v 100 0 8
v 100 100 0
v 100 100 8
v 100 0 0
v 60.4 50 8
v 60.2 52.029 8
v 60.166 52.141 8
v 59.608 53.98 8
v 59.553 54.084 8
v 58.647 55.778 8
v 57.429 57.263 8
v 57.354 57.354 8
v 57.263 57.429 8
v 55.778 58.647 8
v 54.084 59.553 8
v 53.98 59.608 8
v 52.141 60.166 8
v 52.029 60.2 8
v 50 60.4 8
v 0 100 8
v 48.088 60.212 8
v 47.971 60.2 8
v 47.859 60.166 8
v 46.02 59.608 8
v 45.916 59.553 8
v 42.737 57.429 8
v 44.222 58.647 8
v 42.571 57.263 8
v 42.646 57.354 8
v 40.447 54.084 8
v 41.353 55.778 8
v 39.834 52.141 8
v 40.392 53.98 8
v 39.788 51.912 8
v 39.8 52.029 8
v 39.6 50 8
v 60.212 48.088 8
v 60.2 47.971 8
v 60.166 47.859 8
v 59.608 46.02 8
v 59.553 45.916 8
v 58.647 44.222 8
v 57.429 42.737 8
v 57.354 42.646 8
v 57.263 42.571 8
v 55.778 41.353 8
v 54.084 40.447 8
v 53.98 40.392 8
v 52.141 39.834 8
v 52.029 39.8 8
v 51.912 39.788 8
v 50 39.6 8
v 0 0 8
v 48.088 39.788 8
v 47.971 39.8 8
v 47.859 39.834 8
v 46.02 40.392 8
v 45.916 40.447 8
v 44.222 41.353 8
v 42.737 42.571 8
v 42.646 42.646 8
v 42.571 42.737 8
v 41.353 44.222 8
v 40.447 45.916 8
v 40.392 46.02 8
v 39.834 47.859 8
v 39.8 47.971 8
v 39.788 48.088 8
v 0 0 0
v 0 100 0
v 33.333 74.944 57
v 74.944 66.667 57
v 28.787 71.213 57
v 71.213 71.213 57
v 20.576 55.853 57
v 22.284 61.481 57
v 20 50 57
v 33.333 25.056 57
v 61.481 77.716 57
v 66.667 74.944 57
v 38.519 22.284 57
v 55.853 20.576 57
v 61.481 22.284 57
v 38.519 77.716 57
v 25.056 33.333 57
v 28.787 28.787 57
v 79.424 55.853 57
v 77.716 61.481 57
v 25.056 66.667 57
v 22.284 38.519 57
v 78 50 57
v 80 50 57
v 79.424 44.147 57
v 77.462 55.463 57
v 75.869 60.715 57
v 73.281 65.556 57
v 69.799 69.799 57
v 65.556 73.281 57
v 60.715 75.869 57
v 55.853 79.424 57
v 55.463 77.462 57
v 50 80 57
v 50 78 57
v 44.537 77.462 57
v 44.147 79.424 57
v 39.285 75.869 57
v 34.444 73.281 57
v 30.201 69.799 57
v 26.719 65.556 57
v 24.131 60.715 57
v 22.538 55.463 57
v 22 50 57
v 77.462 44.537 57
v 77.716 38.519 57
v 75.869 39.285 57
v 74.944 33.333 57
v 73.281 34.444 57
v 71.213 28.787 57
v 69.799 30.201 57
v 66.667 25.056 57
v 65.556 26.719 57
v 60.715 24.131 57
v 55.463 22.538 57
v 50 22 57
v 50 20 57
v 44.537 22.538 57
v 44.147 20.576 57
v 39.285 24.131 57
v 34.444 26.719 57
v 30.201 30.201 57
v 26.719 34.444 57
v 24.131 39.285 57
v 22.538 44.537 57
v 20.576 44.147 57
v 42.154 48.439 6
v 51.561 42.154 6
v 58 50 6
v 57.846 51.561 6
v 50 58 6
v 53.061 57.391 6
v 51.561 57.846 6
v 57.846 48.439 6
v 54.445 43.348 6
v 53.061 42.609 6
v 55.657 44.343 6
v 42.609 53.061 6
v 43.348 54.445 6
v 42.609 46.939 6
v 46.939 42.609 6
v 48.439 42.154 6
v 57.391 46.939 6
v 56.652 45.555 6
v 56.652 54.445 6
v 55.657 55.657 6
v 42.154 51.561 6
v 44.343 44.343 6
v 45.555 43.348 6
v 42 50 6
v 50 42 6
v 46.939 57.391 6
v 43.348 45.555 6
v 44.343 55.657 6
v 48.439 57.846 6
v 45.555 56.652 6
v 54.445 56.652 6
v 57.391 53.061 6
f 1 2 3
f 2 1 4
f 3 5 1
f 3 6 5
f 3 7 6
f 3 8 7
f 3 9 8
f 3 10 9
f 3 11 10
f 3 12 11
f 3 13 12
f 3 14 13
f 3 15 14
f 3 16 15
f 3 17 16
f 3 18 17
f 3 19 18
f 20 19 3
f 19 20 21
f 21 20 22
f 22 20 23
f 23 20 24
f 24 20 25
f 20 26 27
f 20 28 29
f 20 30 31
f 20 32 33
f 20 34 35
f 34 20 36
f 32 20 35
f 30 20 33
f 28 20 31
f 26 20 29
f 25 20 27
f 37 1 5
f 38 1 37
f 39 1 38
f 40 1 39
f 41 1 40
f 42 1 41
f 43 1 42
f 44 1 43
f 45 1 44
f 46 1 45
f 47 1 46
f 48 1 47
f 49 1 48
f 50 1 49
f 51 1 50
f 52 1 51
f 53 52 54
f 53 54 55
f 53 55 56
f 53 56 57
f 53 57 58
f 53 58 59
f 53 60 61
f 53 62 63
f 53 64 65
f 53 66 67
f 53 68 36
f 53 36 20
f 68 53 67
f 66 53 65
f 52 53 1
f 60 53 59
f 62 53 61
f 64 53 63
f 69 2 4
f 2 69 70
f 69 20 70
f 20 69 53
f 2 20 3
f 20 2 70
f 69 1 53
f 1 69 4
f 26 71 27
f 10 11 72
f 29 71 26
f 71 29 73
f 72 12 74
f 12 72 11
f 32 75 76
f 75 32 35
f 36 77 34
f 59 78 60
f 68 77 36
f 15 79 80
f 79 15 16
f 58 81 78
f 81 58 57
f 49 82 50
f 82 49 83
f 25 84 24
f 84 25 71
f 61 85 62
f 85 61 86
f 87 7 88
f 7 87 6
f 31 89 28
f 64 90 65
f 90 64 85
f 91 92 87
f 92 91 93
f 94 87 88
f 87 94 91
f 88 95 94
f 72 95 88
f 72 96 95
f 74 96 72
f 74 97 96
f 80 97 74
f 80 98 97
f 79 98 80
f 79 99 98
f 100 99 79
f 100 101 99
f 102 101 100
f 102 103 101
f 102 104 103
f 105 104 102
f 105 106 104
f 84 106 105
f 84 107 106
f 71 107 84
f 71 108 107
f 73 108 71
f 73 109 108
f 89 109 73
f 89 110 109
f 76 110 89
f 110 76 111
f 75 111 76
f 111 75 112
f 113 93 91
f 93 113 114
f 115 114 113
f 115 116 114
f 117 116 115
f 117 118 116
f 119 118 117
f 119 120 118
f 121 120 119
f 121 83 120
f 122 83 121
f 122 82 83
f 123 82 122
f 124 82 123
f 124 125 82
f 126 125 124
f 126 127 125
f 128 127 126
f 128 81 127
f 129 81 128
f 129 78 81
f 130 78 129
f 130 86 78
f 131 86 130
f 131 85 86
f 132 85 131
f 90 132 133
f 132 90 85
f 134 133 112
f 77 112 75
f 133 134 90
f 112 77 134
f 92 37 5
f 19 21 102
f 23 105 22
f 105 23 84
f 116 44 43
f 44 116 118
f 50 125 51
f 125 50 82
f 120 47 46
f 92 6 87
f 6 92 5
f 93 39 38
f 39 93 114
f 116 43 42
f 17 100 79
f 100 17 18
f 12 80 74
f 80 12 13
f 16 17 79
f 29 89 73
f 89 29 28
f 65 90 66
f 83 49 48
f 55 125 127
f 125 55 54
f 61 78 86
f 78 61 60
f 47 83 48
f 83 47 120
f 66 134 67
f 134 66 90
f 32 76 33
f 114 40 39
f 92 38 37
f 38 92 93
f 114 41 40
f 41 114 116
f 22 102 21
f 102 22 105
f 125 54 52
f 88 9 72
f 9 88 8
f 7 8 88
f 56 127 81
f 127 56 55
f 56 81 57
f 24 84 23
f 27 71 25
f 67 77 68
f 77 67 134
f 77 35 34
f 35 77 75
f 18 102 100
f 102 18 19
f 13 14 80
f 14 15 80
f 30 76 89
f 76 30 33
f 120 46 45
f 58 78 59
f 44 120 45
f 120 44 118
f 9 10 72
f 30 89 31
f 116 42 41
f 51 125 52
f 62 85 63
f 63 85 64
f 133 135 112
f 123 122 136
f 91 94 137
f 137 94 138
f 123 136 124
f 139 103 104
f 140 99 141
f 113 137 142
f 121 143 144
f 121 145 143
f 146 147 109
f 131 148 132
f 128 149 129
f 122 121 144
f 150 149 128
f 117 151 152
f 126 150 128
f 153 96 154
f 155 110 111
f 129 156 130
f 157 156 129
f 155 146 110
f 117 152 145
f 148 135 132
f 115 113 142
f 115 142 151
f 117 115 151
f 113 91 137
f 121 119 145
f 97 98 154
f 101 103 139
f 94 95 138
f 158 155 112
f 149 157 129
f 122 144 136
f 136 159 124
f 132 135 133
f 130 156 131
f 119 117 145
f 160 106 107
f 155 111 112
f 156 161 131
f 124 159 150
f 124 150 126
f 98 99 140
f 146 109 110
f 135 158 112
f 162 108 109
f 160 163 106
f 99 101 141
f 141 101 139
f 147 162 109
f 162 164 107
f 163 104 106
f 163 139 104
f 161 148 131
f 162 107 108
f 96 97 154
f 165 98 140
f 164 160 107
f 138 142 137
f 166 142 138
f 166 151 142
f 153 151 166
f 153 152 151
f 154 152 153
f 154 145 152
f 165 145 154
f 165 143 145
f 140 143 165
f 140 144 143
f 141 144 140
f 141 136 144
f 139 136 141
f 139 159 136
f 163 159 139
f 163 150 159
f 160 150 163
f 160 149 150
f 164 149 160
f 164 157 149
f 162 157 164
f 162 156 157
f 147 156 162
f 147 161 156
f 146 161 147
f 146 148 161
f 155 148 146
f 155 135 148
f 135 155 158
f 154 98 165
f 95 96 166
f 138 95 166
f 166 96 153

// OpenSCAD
$fn = 32;

// ----------------------------------------------------------------------
// Hopper: funnel with square flange
// ----------------------------------------------------------------------

// --- parameters (mm) ---
fl = 100;                 // flange side, X and Y
fl_t = 8;                 // flange thickness
cone_h = 50;              // cone height above the flange
top_d = 60;               // cone mouth diameter
bot_d = 20;               // cone spout diameter
wall = 2;                 // cone wall thickness

bore_d = bot_d - 2 * wall;  // spout bore diameter
total_h = fl_t + cone_h - 1;  // overall height

difference() {
  union() {
    cube([fl, fl, fl_t]);
    translate([fl / 2, fl / 2, fl_t - 1])
      cylinder(h = cone_h, d1 = bot_d, d2 = top_d);
  }
  translate([fl / 2, fl / 2, fl_t - 2])
    cylinder(h = cone_h + 1, d1 = bore_d, d2 = top_d - 2 * wall);
}
